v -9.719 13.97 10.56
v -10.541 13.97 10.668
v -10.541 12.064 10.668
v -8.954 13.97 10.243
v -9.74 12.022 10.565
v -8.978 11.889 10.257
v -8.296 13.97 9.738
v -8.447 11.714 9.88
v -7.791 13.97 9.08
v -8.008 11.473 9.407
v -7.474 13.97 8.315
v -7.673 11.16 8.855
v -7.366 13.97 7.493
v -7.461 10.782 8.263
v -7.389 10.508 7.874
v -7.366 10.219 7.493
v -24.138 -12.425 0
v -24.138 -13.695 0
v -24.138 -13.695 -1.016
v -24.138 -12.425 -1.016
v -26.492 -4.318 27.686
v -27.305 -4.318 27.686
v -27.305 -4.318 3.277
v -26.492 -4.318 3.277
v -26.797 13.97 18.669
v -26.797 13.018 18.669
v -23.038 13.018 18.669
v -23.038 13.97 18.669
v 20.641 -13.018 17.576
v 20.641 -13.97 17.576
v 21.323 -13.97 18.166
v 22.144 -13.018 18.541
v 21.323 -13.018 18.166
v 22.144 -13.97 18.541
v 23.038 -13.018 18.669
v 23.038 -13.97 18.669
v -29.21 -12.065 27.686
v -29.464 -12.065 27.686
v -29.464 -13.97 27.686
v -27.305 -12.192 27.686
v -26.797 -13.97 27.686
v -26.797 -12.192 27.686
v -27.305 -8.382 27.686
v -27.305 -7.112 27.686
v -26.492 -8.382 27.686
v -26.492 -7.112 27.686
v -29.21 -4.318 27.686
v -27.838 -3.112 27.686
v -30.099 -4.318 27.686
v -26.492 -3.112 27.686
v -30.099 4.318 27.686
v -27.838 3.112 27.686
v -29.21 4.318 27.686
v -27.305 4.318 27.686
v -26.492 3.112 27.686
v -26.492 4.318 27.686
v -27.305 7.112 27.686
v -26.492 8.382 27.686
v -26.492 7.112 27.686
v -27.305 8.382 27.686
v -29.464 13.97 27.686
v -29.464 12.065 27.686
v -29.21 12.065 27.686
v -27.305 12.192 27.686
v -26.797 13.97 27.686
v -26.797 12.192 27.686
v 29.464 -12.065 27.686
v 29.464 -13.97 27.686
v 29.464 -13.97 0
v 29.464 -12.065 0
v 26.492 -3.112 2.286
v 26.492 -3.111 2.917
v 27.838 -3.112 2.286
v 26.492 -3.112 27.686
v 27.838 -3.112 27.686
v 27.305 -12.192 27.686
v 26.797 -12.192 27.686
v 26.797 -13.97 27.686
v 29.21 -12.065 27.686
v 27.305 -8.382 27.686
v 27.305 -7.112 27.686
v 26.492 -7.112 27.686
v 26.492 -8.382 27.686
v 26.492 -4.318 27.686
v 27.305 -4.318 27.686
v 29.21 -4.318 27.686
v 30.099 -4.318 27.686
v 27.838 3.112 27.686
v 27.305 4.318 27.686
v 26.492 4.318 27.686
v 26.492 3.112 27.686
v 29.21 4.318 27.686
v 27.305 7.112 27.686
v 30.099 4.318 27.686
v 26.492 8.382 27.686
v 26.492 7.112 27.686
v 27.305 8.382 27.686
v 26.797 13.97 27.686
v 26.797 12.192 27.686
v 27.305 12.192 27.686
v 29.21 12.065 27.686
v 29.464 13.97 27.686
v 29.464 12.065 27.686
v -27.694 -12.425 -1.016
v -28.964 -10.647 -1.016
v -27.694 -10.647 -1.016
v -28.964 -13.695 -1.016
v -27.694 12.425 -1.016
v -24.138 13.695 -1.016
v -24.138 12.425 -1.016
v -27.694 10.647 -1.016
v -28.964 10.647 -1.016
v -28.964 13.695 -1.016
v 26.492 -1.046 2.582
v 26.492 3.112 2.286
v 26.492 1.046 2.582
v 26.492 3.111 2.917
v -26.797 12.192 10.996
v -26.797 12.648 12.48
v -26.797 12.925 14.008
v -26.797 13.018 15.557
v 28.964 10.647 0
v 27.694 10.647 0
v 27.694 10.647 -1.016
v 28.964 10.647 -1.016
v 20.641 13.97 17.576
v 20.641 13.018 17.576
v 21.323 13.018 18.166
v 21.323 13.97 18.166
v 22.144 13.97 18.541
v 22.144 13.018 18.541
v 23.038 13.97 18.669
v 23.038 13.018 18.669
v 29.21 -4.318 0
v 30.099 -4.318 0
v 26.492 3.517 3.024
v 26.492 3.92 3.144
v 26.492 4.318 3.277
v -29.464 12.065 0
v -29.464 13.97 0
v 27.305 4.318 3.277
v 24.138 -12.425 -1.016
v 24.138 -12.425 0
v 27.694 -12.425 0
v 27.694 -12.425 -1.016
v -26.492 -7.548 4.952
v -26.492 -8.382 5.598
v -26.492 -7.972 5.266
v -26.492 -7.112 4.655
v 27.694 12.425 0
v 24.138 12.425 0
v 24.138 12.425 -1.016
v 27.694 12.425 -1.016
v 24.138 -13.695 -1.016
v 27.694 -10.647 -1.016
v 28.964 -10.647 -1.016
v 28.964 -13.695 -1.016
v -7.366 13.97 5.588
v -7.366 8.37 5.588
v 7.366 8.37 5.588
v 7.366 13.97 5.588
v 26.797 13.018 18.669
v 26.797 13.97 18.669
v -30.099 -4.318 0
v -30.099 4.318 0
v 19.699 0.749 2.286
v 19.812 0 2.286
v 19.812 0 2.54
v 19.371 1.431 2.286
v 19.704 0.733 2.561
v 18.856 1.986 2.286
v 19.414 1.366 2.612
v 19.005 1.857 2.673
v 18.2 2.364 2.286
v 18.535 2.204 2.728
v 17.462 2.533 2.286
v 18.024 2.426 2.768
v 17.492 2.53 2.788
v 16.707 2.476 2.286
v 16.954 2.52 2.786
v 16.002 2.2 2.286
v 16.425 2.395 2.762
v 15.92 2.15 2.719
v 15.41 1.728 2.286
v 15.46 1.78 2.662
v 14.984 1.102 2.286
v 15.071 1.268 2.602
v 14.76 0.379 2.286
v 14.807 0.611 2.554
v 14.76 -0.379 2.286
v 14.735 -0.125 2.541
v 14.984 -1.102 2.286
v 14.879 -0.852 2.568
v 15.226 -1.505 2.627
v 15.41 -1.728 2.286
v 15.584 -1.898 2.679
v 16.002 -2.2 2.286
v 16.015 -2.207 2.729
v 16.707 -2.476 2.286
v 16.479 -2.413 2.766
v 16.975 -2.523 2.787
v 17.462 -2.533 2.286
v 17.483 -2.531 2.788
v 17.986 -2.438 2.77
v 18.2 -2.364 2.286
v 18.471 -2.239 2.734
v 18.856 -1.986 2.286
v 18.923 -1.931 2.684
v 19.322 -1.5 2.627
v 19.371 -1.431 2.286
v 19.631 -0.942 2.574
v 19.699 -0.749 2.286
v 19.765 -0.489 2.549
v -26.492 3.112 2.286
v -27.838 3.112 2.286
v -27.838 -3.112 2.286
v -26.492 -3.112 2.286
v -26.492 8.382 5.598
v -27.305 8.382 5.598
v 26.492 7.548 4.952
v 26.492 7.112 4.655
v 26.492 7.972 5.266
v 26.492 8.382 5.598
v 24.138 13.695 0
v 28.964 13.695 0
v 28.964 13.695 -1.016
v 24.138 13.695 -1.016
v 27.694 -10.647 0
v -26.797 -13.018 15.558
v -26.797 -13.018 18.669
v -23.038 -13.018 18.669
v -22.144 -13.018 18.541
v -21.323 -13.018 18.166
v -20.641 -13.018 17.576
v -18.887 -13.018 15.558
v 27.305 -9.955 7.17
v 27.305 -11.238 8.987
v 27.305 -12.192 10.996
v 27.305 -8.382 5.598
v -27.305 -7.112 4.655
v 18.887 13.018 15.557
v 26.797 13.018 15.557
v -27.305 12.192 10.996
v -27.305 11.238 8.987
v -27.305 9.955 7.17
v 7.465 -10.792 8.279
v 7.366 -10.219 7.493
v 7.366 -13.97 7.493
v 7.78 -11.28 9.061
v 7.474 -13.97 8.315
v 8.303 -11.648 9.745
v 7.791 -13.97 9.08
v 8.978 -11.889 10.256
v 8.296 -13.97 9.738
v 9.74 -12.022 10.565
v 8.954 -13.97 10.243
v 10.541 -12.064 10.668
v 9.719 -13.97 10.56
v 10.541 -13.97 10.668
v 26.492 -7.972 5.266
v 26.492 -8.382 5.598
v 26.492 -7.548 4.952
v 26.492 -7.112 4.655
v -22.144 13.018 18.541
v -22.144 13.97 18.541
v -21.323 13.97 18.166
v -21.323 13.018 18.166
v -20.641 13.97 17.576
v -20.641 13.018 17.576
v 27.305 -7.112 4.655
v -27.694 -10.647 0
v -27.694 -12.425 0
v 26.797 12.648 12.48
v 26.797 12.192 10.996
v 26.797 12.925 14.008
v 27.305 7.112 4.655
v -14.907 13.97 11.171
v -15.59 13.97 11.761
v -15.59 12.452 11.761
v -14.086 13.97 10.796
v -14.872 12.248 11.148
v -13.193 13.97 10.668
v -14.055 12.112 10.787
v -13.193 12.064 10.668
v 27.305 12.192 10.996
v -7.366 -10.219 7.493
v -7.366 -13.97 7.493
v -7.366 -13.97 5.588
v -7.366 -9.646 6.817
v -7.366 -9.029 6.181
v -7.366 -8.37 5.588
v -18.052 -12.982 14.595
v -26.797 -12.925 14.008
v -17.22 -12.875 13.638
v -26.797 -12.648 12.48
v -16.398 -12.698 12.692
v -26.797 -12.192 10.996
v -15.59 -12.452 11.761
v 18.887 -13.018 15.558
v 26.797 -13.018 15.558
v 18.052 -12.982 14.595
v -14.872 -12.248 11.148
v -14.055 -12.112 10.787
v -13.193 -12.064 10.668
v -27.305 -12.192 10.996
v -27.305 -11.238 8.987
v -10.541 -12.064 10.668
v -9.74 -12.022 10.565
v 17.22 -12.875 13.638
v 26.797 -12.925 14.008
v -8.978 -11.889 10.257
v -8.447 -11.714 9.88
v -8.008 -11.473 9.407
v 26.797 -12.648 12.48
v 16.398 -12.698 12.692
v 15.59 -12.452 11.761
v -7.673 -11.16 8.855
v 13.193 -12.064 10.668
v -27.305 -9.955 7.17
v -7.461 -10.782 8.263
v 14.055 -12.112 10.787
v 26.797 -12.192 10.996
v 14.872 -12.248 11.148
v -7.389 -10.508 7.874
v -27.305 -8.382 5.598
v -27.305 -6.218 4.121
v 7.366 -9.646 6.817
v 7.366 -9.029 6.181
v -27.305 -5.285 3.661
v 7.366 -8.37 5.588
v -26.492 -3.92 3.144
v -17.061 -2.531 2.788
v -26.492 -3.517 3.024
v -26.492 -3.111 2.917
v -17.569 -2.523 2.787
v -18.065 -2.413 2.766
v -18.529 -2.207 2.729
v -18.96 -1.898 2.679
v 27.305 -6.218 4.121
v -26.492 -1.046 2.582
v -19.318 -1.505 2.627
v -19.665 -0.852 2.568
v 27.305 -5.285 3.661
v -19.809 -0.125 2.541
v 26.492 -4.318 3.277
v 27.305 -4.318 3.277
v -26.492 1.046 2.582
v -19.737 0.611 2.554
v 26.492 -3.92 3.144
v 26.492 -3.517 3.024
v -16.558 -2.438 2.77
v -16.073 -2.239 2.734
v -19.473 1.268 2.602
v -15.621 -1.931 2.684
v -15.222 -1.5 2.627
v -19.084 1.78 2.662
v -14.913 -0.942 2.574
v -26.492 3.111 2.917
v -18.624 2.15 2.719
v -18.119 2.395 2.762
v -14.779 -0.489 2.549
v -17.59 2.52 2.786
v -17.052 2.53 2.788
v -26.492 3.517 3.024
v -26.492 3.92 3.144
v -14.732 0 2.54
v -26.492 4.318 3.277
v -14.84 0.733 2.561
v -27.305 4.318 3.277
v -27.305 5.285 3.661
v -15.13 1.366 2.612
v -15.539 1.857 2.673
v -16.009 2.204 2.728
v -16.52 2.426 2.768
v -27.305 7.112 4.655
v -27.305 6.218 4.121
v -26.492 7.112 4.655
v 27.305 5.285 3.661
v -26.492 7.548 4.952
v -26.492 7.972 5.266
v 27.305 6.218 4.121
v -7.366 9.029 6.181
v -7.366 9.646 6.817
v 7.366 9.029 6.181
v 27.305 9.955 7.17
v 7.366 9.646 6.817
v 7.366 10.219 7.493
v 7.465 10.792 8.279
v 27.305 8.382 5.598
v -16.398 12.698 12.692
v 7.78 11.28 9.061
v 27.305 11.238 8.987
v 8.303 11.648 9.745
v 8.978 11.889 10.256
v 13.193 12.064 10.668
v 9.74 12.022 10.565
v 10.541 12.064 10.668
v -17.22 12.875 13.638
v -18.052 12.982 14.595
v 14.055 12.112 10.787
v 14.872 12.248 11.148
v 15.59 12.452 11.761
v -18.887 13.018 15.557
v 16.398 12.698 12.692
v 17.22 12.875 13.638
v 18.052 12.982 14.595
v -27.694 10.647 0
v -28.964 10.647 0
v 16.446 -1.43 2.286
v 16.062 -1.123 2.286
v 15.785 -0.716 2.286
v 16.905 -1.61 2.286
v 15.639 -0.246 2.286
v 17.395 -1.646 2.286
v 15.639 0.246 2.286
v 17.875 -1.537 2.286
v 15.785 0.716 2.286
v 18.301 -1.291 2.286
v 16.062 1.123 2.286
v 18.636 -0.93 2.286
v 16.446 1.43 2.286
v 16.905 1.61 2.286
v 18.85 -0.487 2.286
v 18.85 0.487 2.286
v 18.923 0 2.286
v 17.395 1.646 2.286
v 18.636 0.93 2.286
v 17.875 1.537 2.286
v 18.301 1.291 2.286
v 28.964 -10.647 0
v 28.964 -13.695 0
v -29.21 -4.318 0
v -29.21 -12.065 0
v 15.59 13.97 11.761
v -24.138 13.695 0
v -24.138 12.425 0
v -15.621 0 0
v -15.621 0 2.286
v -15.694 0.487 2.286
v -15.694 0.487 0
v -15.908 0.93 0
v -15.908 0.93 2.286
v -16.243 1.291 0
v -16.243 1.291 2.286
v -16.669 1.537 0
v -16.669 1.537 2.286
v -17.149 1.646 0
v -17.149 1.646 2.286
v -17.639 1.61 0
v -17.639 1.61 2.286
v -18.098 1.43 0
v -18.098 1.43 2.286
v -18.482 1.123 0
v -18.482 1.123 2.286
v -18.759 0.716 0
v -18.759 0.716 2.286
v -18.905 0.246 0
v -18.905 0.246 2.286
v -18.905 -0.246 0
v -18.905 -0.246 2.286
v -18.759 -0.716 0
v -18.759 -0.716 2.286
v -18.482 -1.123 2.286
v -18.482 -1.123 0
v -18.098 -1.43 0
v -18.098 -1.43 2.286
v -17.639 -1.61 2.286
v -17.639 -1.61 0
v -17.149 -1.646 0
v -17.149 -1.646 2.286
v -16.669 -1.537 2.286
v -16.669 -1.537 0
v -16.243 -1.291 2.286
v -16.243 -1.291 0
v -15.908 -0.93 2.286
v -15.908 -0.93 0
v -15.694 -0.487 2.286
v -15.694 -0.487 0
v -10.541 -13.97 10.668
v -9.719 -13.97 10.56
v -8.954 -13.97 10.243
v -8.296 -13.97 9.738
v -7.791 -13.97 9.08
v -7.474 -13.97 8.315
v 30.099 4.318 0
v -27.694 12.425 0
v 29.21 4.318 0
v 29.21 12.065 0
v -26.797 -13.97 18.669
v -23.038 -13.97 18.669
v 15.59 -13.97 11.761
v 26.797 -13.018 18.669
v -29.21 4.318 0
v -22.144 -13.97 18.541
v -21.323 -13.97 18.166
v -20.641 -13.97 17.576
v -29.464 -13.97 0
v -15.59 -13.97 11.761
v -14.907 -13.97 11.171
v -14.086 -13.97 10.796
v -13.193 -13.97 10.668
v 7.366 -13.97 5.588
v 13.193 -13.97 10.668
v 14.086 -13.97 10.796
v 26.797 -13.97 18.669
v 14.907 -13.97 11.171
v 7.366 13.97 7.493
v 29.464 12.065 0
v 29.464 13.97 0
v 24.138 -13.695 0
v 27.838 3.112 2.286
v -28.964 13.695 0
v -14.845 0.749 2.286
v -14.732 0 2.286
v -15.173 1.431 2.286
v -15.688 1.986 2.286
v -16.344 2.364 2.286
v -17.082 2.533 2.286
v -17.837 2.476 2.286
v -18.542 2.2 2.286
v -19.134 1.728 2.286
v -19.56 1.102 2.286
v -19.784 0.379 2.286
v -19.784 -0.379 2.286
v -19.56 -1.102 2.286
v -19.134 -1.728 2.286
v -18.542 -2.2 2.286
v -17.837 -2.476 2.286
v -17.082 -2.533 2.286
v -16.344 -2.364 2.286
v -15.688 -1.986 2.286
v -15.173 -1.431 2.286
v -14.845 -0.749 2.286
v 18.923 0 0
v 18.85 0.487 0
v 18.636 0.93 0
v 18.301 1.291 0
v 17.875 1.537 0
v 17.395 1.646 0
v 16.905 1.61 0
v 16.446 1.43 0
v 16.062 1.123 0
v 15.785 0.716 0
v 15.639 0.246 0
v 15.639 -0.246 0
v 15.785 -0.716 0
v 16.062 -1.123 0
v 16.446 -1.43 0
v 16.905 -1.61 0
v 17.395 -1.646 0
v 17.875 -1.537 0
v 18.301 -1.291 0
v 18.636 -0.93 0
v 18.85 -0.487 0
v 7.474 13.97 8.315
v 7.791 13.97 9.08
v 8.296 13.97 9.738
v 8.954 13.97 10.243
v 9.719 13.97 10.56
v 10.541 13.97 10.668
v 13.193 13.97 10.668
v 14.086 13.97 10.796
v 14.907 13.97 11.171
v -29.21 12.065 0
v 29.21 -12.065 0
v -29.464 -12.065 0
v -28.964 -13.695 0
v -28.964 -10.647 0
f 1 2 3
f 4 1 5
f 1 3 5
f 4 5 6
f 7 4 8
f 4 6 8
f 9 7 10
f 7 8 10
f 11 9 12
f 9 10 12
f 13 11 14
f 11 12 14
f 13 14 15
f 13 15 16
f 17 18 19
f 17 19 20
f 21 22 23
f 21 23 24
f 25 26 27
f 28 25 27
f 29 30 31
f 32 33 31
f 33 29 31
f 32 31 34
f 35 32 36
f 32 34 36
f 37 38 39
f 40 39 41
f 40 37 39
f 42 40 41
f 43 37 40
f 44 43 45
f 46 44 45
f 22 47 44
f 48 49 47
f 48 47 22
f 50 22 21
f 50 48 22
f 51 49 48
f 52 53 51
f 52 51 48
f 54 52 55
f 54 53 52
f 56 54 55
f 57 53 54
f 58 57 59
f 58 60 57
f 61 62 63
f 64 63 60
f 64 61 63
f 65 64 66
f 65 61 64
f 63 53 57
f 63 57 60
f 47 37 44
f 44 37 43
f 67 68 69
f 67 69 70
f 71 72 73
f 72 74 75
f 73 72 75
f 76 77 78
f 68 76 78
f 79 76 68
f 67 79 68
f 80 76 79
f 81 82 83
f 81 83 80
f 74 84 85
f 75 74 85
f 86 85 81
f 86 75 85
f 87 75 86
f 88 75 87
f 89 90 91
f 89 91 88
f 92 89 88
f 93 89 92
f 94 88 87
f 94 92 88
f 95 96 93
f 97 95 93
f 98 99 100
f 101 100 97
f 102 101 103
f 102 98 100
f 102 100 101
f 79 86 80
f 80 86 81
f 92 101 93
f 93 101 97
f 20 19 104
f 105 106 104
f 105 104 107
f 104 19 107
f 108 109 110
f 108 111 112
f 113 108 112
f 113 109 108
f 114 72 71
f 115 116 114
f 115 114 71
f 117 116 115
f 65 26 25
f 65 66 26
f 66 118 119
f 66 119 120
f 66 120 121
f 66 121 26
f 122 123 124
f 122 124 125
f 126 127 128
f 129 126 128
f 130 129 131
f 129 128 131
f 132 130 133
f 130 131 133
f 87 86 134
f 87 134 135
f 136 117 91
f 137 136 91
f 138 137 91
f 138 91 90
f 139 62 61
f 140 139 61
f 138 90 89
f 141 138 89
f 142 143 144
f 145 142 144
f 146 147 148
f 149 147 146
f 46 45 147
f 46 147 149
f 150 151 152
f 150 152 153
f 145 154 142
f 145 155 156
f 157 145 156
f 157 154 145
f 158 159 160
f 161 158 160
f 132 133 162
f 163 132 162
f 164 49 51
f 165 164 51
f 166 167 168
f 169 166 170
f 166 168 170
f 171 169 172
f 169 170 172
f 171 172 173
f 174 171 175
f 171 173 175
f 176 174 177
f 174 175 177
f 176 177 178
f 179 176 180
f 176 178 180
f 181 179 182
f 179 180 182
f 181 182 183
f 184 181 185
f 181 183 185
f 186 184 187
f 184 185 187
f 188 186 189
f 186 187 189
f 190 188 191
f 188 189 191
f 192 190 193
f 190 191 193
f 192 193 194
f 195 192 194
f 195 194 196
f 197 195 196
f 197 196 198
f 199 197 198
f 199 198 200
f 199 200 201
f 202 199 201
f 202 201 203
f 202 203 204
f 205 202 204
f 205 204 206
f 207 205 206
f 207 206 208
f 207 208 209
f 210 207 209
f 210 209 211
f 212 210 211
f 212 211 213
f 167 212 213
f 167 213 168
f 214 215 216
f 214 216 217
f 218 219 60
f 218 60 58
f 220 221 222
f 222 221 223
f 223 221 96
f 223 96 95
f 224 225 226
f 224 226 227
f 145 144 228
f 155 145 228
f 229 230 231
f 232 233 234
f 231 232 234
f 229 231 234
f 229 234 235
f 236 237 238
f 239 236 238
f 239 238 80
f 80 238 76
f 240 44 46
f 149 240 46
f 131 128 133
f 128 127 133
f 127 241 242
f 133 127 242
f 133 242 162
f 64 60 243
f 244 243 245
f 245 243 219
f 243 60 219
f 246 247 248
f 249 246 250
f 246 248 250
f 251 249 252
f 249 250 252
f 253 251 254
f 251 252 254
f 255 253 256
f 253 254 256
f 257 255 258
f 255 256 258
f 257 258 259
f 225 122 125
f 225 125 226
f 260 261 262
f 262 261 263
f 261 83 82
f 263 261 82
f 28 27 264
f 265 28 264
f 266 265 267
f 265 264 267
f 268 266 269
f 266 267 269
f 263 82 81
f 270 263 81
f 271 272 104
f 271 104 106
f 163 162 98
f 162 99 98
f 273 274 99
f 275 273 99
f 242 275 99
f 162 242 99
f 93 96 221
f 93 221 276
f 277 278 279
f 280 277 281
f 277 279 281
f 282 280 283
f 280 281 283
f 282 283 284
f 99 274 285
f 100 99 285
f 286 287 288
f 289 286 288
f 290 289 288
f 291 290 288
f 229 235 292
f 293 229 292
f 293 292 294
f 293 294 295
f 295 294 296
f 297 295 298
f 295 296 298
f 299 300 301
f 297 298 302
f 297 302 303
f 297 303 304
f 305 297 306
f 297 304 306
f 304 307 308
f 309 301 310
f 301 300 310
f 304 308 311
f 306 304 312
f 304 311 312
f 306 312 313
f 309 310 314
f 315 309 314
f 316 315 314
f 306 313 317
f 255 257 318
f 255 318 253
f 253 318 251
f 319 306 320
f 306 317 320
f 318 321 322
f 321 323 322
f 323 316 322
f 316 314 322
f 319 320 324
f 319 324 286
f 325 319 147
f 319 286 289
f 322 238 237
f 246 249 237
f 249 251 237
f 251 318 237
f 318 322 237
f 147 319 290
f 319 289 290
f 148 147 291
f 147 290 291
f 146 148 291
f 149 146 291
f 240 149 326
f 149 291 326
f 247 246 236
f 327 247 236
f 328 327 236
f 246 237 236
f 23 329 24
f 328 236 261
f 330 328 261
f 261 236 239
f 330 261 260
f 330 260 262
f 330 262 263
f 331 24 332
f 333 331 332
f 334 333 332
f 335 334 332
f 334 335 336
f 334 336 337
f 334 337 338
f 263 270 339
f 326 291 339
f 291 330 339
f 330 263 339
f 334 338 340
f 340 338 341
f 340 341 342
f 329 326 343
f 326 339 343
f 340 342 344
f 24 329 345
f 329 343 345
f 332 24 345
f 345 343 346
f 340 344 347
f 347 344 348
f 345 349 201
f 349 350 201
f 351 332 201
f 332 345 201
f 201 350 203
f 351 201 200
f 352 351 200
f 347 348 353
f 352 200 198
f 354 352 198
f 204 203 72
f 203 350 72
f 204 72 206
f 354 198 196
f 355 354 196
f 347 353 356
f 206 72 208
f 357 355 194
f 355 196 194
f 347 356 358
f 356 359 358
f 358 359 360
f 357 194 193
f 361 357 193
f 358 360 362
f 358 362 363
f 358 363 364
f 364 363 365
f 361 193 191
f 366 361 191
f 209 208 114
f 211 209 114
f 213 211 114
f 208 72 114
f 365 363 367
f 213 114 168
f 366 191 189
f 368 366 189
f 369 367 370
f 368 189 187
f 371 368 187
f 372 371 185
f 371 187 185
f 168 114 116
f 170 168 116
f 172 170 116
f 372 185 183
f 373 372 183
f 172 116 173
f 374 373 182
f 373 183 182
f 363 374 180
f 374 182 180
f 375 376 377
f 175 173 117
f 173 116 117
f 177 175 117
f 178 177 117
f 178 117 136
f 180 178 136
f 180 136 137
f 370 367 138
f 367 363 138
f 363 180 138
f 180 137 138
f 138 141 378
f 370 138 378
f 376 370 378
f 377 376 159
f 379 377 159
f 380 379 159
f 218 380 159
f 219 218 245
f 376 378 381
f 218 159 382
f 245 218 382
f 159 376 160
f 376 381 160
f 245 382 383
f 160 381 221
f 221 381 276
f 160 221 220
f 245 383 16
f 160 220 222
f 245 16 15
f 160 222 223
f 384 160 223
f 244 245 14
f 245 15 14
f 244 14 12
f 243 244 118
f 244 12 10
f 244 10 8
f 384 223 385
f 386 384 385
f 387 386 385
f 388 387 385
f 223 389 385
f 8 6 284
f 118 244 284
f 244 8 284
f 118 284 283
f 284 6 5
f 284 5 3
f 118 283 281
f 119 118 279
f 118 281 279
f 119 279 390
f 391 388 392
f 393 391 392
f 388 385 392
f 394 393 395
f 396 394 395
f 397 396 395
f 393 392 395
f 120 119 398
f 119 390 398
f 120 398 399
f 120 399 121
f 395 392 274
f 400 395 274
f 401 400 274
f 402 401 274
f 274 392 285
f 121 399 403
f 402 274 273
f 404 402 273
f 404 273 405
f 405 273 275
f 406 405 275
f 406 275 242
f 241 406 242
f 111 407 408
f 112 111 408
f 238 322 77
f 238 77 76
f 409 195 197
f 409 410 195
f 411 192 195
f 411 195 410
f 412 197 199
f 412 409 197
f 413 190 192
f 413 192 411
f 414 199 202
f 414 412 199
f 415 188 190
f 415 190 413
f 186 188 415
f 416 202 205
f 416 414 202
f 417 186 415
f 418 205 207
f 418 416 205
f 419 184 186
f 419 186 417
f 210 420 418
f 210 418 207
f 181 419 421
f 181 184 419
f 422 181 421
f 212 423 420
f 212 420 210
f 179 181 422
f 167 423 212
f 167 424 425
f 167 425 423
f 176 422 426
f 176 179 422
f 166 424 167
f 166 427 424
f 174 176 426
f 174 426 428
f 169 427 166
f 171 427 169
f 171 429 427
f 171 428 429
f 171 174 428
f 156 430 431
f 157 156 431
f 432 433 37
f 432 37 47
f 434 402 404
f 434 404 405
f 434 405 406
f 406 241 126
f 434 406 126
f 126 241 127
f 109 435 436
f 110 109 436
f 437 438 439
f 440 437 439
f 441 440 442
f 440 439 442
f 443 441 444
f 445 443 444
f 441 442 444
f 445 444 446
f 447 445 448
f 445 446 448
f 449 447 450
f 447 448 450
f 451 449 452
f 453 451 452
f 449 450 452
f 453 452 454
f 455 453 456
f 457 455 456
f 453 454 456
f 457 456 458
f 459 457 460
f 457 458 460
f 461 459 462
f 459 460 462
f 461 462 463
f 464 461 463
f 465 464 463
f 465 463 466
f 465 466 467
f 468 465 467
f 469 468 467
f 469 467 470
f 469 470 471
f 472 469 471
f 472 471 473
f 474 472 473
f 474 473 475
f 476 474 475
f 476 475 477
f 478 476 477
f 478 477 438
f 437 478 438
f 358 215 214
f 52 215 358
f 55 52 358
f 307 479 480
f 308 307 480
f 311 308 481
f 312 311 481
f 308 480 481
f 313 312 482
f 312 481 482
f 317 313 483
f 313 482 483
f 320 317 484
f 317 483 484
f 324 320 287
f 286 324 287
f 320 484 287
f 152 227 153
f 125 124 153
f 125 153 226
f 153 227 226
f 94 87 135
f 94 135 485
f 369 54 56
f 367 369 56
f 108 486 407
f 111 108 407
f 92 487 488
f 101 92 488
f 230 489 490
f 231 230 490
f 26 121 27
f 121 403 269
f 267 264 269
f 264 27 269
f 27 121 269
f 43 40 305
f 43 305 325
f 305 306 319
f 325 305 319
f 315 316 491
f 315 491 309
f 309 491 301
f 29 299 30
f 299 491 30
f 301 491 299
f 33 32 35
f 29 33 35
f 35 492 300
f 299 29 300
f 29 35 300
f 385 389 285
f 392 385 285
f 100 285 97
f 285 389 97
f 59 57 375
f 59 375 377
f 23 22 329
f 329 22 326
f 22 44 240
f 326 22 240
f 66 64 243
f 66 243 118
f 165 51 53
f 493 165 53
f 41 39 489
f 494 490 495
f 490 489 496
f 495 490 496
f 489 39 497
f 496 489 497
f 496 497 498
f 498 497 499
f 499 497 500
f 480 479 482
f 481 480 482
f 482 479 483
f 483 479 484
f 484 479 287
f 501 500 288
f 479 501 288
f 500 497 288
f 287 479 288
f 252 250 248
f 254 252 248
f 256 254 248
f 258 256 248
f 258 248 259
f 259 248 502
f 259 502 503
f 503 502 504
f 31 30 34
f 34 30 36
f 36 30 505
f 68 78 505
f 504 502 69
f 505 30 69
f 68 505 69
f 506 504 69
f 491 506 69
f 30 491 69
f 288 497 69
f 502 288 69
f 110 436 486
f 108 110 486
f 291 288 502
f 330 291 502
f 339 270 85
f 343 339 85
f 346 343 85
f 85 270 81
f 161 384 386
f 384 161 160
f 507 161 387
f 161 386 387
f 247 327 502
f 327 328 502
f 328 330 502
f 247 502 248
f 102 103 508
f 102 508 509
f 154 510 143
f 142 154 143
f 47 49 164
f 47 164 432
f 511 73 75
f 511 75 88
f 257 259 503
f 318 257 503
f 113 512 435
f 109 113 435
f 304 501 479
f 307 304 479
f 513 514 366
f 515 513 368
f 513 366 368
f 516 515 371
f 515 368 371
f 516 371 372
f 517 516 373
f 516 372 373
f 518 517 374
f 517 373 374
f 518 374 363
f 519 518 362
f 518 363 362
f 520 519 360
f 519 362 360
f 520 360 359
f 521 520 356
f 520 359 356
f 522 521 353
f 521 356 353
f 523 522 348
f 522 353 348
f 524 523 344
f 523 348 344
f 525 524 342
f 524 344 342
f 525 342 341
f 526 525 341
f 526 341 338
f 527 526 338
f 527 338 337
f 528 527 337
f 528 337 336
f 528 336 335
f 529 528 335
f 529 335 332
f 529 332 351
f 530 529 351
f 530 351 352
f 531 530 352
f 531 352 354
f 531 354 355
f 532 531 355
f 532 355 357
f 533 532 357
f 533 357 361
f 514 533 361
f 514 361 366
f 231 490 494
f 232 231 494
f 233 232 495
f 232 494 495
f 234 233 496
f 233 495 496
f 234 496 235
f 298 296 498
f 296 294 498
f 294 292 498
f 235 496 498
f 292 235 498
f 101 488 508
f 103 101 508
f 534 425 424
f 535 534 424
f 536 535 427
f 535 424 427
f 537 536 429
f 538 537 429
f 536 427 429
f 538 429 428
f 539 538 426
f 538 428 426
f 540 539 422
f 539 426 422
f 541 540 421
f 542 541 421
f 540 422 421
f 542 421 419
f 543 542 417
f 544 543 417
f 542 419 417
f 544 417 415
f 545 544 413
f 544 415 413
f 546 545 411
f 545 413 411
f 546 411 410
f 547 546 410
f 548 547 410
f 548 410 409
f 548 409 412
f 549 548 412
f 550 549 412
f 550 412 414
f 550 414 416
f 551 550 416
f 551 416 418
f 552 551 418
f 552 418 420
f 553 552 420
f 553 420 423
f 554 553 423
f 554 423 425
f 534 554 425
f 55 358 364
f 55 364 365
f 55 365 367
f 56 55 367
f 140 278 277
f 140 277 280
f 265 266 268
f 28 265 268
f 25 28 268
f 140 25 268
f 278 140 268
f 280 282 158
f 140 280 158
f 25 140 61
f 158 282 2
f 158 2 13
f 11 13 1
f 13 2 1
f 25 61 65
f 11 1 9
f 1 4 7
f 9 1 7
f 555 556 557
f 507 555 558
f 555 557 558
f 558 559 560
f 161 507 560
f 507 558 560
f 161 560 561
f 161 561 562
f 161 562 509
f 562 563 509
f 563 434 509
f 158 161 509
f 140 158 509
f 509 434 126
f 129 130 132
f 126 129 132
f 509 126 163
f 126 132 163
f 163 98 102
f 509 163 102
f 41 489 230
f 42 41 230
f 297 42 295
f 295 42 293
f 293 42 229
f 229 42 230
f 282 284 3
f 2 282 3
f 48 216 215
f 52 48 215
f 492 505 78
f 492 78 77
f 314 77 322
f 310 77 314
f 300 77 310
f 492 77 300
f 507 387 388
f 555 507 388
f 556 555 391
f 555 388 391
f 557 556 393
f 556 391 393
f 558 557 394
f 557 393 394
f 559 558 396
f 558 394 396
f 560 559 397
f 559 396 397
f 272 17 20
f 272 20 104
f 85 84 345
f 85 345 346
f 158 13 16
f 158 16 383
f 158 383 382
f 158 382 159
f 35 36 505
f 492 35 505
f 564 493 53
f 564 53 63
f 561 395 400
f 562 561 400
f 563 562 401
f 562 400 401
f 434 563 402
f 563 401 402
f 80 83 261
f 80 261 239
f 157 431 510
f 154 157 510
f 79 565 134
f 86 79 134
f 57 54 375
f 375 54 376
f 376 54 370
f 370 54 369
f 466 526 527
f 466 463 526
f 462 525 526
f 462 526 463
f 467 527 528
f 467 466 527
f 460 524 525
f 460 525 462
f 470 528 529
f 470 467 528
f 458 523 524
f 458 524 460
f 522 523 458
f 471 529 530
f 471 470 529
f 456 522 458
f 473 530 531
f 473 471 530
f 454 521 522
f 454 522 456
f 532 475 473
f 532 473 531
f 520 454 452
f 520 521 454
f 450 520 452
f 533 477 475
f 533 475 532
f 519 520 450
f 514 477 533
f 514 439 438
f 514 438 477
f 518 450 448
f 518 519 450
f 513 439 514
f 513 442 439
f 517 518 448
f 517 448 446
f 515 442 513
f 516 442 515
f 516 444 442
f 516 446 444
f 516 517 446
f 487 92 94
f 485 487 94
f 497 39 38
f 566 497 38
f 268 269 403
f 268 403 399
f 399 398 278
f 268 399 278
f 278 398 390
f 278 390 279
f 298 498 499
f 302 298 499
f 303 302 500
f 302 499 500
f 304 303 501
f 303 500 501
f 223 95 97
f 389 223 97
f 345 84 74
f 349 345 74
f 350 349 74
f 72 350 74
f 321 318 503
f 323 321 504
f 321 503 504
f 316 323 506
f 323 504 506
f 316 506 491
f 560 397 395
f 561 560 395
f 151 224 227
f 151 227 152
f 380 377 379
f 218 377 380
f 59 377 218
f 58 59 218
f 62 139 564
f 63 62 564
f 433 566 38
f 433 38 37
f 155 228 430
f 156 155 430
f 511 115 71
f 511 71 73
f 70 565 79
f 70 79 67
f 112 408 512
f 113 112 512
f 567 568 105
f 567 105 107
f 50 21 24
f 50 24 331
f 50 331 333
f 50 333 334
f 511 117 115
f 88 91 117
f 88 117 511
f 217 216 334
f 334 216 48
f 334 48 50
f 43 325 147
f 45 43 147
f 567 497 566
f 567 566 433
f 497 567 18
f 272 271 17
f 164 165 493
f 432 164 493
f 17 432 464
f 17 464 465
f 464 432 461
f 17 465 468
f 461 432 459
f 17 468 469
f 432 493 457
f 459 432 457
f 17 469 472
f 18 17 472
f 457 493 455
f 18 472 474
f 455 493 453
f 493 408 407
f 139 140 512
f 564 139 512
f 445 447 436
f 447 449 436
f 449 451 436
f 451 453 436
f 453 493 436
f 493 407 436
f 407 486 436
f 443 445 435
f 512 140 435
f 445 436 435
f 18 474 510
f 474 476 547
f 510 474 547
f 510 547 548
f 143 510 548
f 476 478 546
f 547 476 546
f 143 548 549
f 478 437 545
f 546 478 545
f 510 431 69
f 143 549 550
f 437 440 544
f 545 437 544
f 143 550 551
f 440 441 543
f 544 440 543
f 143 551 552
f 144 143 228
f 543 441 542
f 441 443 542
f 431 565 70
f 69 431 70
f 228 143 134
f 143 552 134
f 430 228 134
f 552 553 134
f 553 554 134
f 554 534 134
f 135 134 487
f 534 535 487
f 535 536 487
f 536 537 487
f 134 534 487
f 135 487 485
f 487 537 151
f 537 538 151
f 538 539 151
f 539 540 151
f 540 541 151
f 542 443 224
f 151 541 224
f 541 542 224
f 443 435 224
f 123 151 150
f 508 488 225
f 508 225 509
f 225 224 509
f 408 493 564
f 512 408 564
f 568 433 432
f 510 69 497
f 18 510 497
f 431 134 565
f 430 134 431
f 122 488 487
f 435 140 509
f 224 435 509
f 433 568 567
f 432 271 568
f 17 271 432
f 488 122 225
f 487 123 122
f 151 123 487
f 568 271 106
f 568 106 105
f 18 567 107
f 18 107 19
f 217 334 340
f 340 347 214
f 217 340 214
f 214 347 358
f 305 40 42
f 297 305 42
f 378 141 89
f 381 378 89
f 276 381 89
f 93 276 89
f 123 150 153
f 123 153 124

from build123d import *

# Parameters (mm, degrees)
SKETCH1_W            = 58.42
SKETCH1_H            = 27.94
BOSS_EXTRUDE1_DEPTH  = 27.686
SKETCH2_W            = 0.889
SKETCH2_H            = 8.636
SKETCH2_W_2          = 0.254
SKETCH2_H_2          = 1.905
BOSS_EXTRUDE3_DEPTH  = 27.686
CUT_EXTRUDE1_DEPTH   = 27.305
CUT_EXTRUDE3_DEPTH   = 50.528860243
SKETCH6_W            = 0.508
SKETCH6_H            = 1.778
SKETCH6_W_2          = 0.8128
SKETCH6_H_2          = 1.27
SKETCH6_H_3          = 8.636
BOSS_EXTRUDE4_DEPTH  = 27.686
SKETCH7_W            = 1.3462
SKETCH7_H            = 6.223
CUT_EXTRUDE4_DEPTH   = 25.4
SKETCH8_R            = 1.651
CUT_EXTRUDE5_DEPTH   = 44.216030588
SKETCH9_R            = 2.54
CUT_EXTRUDE6_DEPTH   = 25.4
BOSS_EXTRUDE5_DEPTH  = 1.016
MIRROR3_COPY_1_DEPTH = 1.016


with BuildPart() as part:
    # Sketch1 → Boss-Extrude1 (new body)
    with BuildSketch(Plane.XY):
        Rectangle(SKETCH1_W, SKETCH1_H)
    extrude(amount=BOSS_EXTRUDE1_DEPTH)

    # Sketch2 → Boss-Extrude3 (add)
    with BuildSketch(Plane.XY.offset(27.686)):
        with Locations((-29.6545, 0)):
            Rectangle(SKETCH2_W, SKETCH2_H)
        with Locations((-29.337, 13.0175)):
            Rectangle(SKETCH2_W_2, SKETCH2_H_2)
        with Locations((-29.337, -13.0175)):
            Rectangle(SKETCH2_W_2, SKETCH2_H_2)
        with Locations((29.337, -13.0175)):
            Rectangle(SKETCH2_W_2, SKETCH2_H_2)
        with Locations((29.337, 13.0175)):
            Rectangle(SKETCH2_W_2, SKETCH2_H_2)
        with Locations((29.6545, 0)):
            Rectangle(SKETCH2_W, SKETCH2_H)
    extrude(amount=-BOSS_EXTRUDE3_DEPTH)

    # Sketch4 → Cut-Extrude1 (cut, symmetric)
    with BuildSketch(Plane(origin=(0, 0, 0), x_dir=(0, 0, -1), z_dir=(1, 0, 0))):
        with BuildLine():
            Line((-15.5575, 13.0175), (-27.686, 13.0175))
            Line((-27.686, 13.0175), (-27.686, -13.0175))
            Line((-27.686, -13.0175), (-15.5575, -13.0175))
            ThreePointArc((-15.5575, -13.0175), (-2.54, 0), (-15.5575, 13.0175))
        make_face()
    extrude(amount=CUT_EXTRUDE1_DEPTH, both=True, mode=Mode.SUBTRACT)

    # Sketch5 → Cut-Extrude3 (cut, through all)
    with BuildSketch(Plane.XZ.offset(13.97)):
        with BuildLine():
            Line((-27.305, 27.686), (-27.305, 18.669))
            Line((-27.305, 18.669), (-23.037688998, 18.669))
            ThreePointArc((-23.037688998, 18.669), (-21.720466793, 18.382866674), (-20.640662648, 17.576039787))
            Line((-20.640662648, 17.576039787), (-15.589726503, 11.760960213))
            ThreePointArc((-15.589726503, 11.760960213), (-14.509922358, 10.954133326), (-13.192700152, 10.668))
            Line((-13.192700152, 10.668), (-10.541, 10.668))
            ThreePointArc((-10.541, 10.668), (-8.29593597, 9.73806403), (-7.366, 7.493))
            Line((-7.366, 7.493), (-7.366, 5.588))
            Line((-7.366, 5.588), (7.366, 5.588))
            Line((7.366, 5.588), (7.366, 7.493))
            ThreePointArc((7.366, 7.493), (8.29593597, 9.73806403), (10.541, 10.668))
            Line((10.541, 10.668), (13.192700152, 10.668))
            ThreePointArc((13.192700152, 10.668), (14.509922358, 10.954133326), (15.589726503, 11.760960213))
            Line((15.589726503, 11.760960213), (20.640662648, 17.576039787))
            ThreePointArc((20.640662648, 17.576039787), (21.720466793, 18.382866674), (23.037688998, 18.669))
            Line((23.037688998, 18.669), (27.305, 18.669))
            Line((27.305, 18.669), (27.305, 27.686))
            Line((27.305, 27.686), (-27.305, 27.686))
        make_face()
    extrude(amount=-CUT_EXTRUDE3_DEPTH, mode=Mode.SUBTRACT)

    # Sketch6 → Boss-Extrude4 (add)
    with BuildSketch(Plane.XY.offset(27.686)):
        with Locations((-27.051, 13.081)):
            Rectangle(SKETCH6_W, SKETCH6_H)
        with Locations((-26.8986, 7.747)):
            Rectangle(SKETCH6_W_2, SKETCH6_H_2)
        with Locations((-26.8986, 0)):
            Rectangle(SKETCH6_W_2, SKETCH6_H_3)
        with Locations((-26.8986, -7.747)):
            Rectangle(SKETCH6_W_2, SKETCH6_H_2)
        with Locations((-27.051, -13.081)):
            Rectangle(SKETCH6_W, SKETCH6_H)
        with Locations((27.051, -13.081)):
            Rectangle(SKETCH6_W, SKETCH6_H)
        with Locations((26.8986, -7.747)):
            Rectangle(SKETCH6_W_2, SKETCH6_H_2)
        with Locations((26.8986, 0)):
            Rectangle(SKETCH6_W_2, SKETCH6_H_3)
        with Locations((26.8986, 7.747)):
            Rectangle(SKETCH6_W_2, SKETCH6_H_2)
        with Locations((27.051, 13.081)):
            Rectangle(SKETCH6_W, SKETCH6_H)
    extrude(amount=-BOSS_EXTRUDE4_DEPTH)

    # Sketch7 → Cut-Extrude4 (cut)
    with BuildSketch(Plane.XY.offset(27.686)):
        with Locations((-27.1653, 0)):
            Rectangle(SKETCH7_W, SKETCH7_H)
        with Locations((27.1653, 0)):
            Rectangle(SKETCH7_W, SKETCH7_H)
    extrude(amount=-CUT_EXTRUDE4_DEPTH, mode=Mode.SUBTRACT)

    # Sketch8 → Cut-Extrude5 (cut, through all)
    with BuildSketch(Plane.XY.offset(27.686)):
        with Locations((-17.272, 0)):
            Circle(SKETCH8_R)
        with Locations((17.272, 0)):
            Circle(SKETCH8_R)
    extrude(amount=-CUT_EXTRUDE5_DEPTH, mode=Mode.SUBTRACT)

    # Sketch9 → Cut-Extrude6 (cut)
    with BuildSketch(Plane.XY.offset(27.686)):
        with Locations((-17.272, 0)):
            Circle(SKETCH9_R)
        with Locations((17.272, 0)):
            Circle(SKETCH9_R)
    extrude(amount=-CUT_EXTRUDE6_DEPTH, mode=Mode.SUBTRACT)

    # Sketch10 → Boss-Extrude5 (add)
    with BuildSketch(Plane(origin=(0, 0, 0), x_dir=(-1, 0, 0), z_dir=(0, 0, -1))):
        Polygon((-28.963662415, 10.647390084), (-28.963662415, 13.695390084), (-24.137662415, 13.695390084), (-24.137662415, 12.425390084), (-27.693662415, 12.425390084), (-27.693662415, 10.647390084), align=None)
    boss_extrude5 = extrude(amount=BOSS_EXTRUDE5_DEPTH)

    # Mirror2: Boss-Extrude5 across plane
    add(boss_extrude5.mirror(Plane.ZX))

    # Mirror3: Boss-Extrude5 across plane
    add(boss_extrude5.mirror(Plane(origin=(0, 0, 0), x_dir=(0, 0, 1), z_dir=(1, 0, 0))))

    # Mirror3 copy 1 sketch → Mirror3 copy 1 (add)
    with BuildSketch(Plane(origin=(0, 0, 0), x_dir=(1, 0, 0), z_dir=(0, 0, -1))):
        Polygon((-28.963662415, 10.647390084), (-28.963662415, 13.695390084), (-24.137662415, 13.695390084), (-24.137662415, 12.425390084), (-27.693662415, 12.425390084), (-27.693662415, 10.647390084), align=None)
    extrude(amount=MIRROR3_COPY_1_DEPTH)


solid = part.part
